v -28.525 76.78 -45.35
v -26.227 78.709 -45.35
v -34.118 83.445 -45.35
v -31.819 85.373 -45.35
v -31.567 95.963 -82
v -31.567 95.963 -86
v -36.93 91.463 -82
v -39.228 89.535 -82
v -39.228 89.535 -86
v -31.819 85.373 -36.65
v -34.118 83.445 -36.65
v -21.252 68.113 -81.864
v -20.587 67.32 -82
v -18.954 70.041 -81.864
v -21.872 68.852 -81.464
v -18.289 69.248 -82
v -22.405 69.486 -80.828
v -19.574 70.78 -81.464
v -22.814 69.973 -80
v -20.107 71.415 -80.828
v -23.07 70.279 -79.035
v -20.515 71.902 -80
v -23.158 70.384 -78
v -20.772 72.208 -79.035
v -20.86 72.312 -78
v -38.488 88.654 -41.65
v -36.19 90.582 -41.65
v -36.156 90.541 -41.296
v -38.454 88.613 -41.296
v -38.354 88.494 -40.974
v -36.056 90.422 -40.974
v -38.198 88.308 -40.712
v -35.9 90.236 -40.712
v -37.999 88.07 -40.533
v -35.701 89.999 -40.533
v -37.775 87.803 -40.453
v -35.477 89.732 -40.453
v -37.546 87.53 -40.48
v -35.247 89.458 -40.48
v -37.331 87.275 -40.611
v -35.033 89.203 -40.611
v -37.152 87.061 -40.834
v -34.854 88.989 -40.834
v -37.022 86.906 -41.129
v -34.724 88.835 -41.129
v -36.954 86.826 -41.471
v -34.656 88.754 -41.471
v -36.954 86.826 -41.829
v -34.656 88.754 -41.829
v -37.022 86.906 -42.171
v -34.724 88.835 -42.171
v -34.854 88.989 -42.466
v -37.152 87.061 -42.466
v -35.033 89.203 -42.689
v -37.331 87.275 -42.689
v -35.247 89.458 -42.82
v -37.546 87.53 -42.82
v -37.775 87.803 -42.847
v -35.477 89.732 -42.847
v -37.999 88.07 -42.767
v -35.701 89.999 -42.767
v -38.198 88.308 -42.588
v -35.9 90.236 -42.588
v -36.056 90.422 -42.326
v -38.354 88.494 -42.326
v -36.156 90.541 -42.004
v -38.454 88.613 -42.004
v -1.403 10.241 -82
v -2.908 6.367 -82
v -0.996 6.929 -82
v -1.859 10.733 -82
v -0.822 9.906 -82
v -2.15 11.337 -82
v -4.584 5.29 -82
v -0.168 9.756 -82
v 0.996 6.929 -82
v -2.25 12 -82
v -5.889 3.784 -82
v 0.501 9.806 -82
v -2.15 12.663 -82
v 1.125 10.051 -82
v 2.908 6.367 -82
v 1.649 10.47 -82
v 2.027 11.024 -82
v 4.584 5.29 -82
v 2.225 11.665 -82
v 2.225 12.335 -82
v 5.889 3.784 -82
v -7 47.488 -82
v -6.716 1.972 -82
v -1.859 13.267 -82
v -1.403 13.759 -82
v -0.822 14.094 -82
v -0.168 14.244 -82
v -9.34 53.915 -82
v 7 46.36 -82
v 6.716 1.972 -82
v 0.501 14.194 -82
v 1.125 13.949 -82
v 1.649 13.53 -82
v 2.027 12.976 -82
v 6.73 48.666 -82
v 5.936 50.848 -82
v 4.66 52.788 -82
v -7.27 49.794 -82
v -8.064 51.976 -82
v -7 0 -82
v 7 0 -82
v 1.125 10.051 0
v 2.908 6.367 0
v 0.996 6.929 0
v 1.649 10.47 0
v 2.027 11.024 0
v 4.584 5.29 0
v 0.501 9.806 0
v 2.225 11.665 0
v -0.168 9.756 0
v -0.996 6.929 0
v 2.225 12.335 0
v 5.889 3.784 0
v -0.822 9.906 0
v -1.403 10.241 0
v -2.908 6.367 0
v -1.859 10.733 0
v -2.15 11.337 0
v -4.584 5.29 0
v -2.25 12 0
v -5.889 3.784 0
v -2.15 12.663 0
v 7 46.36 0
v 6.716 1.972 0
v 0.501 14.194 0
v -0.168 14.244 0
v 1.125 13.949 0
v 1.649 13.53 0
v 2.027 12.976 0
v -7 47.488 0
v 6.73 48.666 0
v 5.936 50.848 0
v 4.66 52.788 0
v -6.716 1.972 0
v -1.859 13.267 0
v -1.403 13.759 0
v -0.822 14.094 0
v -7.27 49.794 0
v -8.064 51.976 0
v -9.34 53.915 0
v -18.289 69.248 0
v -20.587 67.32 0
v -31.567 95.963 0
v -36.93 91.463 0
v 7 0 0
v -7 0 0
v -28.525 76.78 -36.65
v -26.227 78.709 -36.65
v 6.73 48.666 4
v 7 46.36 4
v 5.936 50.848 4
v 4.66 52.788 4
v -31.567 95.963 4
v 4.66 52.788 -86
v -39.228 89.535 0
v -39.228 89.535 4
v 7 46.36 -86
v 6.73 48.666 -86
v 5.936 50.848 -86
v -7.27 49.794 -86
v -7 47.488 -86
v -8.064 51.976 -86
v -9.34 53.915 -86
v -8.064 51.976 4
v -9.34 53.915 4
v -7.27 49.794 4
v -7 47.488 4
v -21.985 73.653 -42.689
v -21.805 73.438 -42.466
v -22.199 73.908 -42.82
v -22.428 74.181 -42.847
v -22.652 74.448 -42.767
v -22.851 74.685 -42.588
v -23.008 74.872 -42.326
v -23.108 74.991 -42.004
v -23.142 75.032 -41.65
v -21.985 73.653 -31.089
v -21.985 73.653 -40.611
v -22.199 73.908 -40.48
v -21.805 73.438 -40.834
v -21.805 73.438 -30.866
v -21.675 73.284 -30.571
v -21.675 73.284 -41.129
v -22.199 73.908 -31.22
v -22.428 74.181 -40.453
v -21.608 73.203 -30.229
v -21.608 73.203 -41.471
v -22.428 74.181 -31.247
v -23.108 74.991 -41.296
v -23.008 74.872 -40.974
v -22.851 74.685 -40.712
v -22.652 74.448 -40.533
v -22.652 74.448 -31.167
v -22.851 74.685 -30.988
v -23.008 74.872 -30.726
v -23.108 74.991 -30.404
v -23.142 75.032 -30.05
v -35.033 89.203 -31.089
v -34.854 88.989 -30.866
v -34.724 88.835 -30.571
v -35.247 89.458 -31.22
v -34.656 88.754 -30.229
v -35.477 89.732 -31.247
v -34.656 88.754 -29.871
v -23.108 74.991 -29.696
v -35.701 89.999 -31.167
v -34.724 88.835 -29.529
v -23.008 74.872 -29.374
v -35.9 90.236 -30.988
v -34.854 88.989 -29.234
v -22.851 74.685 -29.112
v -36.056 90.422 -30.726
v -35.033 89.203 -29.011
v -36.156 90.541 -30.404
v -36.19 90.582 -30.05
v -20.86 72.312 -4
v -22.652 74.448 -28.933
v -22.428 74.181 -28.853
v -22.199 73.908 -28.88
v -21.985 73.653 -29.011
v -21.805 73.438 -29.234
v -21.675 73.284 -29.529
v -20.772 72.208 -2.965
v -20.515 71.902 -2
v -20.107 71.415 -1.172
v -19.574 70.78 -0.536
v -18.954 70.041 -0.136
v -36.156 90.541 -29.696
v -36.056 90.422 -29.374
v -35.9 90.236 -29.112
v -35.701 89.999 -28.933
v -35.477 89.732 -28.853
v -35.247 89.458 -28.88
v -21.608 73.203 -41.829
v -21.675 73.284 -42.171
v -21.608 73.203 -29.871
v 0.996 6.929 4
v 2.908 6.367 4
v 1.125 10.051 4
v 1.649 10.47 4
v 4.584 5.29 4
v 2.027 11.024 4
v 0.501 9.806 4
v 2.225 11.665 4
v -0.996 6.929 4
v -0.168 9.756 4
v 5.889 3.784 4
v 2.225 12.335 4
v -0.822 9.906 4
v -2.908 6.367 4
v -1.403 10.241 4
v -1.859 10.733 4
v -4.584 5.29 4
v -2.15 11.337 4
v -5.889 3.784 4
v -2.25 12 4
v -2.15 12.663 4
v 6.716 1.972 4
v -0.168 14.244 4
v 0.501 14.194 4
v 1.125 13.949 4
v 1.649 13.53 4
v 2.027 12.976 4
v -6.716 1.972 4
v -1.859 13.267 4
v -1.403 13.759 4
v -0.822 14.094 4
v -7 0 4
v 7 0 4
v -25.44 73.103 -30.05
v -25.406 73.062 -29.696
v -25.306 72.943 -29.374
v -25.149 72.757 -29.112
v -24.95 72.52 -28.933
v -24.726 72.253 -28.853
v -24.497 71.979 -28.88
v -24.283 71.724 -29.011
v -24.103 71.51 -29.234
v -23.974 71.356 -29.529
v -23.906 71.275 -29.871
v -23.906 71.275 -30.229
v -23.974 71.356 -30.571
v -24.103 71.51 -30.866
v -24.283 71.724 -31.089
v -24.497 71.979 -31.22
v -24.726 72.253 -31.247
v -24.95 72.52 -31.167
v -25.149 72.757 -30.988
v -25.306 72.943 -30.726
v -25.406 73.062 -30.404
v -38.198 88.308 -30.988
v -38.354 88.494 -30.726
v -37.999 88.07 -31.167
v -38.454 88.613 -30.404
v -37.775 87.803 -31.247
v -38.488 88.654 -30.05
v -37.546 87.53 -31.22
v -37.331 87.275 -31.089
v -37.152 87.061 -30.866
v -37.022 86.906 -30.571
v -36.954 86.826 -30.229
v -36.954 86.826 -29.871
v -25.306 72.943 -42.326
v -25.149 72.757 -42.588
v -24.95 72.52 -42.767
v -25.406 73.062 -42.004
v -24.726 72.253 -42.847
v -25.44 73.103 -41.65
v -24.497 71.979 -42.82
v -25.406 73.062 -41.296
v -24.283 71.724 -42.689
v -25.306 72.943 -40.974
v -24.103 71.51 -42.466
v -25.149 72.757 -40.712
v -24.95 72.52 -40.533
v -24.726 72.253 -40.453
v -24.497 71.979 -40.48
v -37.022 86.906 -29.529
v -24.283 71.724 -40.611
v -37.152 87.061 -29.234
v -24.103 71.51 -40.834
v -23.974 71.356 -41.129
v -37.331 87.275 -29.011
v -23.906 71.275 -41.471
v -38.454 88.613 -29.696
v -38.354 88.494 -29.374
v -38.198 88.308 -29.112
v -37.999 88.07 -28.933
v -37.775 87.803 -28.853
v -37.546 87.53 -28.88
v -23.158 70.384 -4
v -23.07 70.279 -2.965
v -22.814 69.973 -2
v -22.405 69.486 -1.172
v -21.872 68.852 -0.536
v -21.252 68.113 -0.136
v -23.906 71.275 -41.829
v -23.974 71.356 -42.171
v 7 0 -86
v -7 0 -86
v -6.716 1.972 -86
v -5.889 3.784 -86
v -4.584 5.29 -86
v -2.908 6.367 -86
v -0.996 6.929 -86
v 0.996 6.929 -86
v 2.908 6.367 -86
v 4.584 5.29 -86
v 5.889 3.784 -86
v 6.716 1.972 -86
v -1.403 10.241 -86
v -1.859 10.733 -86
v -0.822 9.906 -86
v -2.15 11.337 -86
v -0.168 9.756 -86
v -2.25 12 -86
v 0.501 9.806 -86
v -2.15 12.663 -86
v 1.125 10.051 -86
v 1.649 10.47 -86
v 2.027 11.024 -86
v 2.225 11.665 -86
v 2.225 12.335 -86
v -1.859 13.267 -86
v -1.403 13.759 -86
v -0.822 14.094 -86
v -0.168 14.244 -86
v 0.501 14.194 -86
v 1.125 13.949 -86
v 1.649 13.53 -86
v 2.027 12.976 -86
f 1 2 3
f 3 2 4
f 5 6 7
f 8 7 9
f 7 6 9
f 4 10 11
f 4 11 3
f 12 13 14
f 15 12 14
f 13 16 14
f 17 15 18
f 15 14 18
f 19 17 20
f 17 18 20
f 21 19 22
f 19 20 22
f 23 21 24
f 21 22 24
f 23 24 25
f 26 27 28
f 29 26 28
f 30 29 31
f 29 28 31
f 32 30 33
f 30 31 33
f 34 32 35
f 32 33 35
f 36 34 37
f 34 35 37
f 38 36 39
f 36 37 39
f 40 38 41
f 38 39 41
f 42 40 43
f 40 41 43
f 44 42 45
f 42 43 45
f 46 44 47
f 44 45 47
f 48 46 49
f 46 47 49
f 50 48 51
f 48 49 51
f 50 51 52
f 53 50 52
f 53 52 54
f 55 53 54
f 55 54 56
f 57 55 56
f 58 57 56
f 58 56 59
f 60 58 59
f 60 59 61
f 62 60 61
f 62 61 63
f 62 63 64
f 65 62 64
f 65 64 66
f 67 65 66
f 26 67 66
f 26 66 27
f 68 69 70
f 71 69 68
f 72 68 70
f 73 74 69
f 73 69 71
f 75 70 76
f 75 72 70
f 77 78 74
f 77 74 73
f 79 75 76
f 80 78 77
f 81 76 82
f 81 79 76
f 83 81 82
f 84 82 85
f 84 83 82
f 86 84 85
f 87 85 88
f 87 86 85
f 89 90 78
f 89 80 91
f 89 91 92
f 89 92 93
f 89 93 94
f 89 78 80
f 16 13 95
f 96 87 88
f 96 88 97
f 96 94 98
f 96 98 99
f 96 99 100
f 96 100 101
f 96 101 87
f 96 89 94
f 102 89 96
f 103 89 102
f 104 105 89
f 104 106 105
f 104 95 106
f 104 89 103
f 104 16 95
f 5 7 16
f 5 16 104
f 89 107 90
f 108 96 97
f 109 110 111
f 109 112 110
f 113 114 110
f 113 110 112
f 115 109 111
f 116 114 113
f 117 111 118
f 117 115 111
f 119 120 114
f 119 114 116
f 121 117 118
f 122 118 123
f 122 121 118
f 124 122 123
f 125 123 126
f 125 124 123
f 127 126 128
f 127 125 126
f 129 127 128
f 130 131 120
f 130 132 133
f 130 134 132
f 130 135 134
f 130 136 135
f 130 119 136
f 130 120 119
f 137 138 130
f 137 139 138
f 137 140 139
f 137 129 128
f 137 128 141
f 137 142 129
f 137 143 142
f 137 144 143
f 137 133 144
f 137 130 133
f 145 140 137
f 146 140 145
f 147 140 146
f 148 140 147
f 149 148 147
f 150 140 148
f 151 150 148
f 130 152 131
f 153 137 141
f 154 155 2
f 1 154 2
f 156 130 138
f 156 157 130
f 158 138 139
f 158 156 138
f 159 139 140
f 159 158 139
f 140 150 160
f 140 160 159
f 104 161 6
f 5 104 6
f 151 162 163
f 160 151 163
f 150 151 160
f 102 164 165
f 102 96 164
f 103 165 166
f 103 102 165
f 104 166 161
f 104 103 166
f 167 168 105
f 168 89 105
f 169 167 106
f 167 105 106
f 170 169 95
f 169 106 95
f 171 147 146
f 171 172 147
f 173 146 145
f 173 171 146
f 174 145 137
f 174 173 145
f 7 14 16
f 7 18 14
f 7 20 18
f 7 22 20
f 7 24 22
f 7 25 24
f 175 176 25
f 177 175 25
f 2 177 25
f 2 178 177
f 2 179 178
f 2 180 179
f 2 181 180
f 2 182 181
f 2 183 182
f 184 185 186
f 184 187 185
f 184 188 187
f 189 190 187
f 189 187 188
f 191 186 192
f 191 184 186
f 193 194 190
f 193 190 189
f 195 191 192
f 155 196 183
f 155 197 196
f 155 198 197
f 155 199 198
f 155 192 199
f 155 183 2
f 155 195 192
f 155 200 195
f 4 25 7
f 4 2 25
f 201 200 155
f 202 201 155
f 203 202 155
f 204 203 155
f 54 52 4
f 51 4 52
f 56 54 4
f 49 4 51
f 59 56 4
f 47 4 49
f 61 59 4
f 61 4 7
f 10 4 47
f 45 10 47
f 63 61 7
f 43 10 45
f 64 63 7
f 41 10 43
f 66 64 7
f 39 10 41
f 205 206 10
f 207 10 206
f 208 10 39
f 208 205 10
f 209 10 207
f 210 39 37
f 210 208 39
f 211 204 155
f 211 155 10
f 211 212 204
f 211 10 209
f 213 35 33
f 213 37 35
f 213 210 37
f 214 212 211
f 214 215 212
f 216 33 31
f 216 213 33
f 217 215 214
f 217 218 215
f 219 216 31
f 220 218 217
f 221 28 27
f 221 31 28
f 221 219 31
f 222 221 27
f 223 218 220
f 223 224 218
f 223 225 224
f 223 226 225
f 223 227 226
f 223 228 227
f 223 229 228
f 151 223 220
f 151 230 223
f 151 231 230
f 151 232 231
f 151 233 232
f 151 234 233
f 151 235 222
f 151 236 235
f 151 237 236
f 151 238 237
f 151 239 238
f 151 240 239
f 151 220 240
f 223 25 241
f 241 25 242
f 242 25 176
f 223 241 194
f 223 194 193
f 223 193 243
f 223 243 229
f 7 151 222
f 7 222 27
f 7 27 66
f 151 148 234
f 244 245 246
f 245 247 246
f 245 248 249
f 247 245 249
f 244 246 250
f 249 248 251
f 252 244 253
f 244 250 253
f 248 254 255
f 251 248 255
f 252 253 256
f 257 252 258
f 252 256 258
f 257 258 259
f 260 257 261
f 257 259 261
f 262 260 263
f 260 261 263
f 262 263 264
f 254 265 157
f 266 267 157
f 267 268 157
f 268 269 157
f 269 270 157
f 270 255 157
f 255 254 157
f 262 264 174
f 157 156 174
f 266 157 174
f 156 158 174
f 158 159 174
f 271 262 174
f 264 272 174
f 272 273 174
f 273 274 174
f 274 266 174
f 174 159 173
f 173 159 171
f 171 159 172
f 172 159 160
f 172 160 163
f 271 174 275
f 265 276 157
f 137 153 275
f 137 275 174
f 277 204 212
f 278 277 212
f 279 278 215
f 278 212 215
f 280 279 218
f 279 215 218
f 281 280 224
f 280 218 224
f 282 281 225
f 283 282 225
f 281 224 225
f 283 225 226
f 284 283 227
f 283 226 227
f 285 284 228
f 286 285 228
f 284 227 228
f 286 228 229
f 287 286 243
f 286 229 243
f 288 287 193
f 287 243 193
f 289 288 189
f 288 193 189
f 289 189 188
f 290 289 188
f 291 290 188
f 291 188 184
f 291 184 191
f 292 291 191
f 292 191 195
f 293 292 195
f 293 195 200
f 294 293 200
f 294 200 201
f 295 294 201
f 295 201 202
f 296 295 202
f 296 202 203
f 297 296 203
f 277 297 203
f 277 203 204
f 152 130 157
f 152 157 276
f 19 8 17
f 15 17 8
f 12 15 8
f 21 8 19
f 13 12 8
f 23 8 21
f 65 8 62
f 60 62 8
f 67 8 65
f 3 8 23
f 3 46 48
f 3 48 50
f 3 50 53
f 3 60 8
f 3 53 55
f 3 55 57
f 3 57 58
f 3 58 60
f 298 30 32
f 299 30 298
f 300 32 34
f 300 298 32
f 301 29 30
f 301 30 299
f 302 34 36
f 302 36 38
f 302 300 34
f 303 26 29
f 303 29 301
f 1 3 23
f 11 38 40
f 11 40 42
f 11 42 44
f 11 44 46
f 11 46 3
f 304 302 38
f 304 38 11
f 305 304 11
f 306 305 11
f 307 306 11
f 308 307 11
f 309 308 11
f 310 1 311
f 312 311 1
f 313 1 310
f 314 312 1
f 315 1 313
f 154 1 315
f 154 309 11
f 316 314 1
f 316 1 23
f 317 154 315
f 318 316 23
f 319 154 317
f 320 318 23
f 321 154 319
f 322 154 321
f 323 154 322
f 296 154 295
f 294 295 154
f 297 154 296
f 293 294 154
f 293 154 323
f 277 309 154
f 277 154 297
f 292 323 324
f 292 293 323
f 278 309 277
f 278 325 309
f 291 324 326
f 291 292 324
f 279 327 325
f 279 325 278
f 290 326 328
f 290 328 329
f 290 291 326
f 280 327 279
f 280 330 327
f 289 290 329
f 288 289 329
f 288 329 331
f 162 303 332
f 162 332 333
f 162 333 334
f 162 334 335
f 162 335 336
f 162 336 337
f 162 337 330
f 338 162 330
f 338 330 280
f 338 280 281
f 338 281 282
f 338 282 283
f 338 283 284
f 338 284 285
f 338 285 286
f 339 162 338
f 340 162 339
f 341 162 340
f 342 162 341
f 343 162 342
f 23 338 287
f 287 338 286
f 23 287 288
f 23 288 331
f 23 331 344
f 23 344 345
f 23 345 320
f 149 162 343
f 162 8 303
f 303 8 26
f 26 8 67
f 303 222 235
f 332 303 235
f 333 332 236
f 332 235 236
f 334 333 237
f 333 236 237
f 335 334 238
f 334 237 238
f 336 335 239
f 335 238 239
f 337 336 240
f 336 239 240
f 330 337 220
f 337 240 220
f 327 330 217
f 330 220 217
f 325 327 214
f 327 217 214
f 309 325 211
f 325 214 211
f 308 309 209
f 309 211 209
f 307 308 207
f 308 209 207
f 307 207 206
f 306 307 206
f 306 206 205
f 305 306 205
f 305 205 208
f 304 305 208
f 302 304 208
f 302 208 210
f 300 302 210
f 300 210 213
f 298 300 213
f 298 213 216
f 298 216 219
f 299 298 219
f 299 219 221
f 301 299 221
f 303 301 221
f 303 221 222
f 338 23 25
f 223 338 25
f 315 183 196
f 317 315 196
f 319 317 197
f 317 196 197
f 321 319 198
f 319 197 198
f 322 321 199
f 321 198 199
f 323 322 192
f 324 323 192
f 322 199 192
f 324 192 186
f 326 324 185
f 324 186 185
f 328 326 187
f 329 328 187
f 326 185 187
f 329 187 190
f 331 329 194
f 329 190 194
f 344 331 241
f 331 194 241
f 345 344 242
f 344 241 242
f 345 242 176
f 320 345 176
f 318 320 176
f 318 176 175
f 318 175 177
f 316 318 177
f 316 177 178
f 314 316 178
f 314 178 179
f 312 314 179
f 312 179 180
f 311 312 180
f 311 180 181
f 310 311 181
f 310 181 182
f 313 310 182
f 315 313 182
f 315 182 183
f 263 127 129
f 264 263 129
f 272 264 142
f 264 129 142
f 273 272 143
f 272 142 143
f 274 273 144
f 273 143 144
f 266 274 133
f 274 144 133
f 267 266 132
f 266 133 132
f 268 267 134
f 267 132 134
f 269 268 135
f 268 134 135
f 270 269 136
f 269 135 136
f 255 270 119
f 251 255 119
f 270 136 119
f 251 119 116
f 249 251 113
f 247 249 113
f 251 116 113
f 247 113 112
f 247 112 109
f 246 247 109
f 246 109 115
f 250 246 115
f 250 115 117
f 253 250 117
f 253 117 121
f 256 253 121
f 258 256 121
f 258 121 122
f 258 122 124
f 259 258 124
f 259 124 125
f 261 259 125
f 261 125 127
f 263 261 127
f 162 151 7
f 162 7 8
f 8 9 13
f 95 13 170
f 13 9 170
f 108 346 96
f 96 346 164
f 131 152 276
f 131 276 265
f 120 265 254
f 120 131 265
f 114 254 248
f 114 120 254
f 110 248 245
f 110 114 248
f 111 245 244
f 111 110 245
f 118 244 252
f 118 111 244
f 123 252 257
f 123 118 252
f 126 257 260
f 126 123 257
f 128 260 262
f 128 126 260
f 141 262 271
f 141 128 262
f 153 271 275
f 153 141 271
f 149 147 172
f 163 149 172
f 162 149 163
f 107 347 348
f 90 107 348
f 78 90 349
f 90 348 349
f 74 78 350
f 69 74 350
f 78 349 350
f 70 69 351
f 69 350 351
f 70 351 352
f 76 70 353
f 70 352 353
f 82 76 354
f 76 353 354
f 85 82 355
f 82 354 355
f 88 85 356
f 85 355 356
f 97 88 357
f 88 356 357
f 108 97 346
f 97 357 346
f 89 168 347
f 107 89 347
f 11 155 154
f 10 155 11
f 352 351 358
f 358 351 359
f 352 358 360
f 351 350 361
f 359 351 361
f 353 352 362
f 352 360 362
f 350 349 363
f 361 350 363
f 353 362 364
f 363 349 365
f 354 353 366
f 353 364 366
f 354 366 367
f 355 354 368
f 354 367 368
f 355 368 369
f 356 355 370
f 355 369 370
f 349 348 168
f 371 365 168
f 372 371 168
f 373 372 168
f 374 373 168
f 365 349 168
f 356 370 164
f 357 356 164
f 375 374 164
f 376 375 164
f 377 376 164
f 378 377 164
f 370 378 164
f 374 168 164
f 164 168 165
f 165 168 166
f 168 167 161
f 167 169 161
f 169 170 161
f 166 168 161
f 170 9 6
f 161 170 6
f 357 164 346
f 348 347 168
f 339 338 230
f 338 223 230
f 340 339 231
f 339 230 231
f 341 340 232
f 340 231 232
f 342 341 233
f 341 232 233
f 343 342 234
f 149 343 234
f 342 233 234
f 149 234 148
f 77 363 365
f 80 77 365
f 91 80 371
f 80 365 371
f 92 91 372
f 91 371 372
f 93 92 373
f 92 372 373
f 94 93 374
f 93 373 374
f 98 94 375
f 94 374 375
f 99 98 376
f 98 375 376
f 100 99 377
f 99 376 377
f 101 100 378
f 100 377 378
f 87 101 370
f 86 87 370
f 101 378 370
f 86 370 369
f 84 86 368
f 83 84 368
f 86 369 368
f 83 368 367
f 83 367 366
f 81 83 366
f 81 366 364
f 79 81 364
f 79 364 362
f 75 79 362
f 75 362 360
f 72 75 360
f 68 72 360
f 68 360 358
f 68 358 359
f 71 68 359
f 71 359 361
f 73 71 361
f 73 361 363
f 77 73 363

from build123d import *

# Parameters (mm, degrees)
ESTRUSIONE_ESTRUSIONE1_DEPTH = 4
ESTRUSIONE_ESTRUSIONE2_DEPTH = 82
ESTRUSIONE_ESTRUSIONE3_START = 4
ESTRUSIONE_ESTRUSIONE3_DEPTH = 4
FORO_PER_VITE_M4_1_D         = 4.5
FORO_PER_VITE_M4_1_DEPTH     = 188
FORO_PER_VITE_M4_1_TIP       = 1.351936393
SCHIZZO6_R                   = 1.2
SCHIZZO6_W                   = 8.7
SCHIZZO6_H                   = 8.7
TAGLIO_ESTRUSIONE1_DEPTH     = 10
RACCORDO1_R                  = 10
RACCORDO2_R                  = 4


with BuildPart() as part:
    # Schizzo1 → Estrusione-Estrusione1 (new body)
    with BuildSketch(Plane.XY):
        with BuildLine():
            Line((-7, 0), (-7, 51.127312028))
            Line((-7, 51.127312028), (-39.227701012, 89.53479049))
            Line((-39.227701012, 89.53479049), (-31.567256581, 95.962666587))
            Line((-31.567256581, 95.962666587), (7, 50))
            Line((7, 50), (7, 0))
            ThreePointArc((7, 0), (0, 7), (-7, 0))
        make_face()
    extrude(amount=ESTRUSIONE_ESTRUSIONE1_DEPTH)

    # Schizzo4 → Estrusione-Estrusione2 (add)
    with BuildSketch(Plane.XY):
        Polygon((-39.227701012, 89.53479049), (-23.15801077, 70.383679412), (-20.859877441, 72.312042241), (-36.929567683, 91.463153319), align=None)
    extrude(amount=-ESTRUSIONE_ESTRUSIONE2_DEPTH)

    # Schizzo5 → Estrusione-Estrusione3 (add)
    with BuildSketch(Plane(origin=(0, 0, -82), x_dir=(-1, 0, 0), z_dir=(0, 0, -1)).offset(ESTRUSIONE_ESTRUSIONE3_START)):
        with BuildLine():
            Line((-7, 0), (-7, 50))
            Line((-7, 50), (31.567256581, 95.962666587))
            Line((31.567256581, 95.962666587), (39.227701012, 89.53479049))
            Line((39.227701012, 89.53479049), (7, 51.127312028))
            Line((7, 51.127312028), (7, 0))
            ThreePointArc((7, 0), (0, 7), (-7, 0))
        make_face()
    extrude(amount=-ESTRUSIONE_ESTRUSIONE3_DEPTH)

    # Foro per Vite M4-1
    with Locations(Plane.XY.offset(4)):
        with Locations((0, 12)):
            Hole(FORO_PER_VITE_M4_1_D / 2, depth=FORO_PER_VITE_M4_1_DEPTH)
            with Locations((0, 0, -(FORO_PER_VITE_M4_1_DEPTH + FORO_PER_VITE_M4_1_TIP / 2))):  # 118° drill point
                Cone(0, FORO_PER_VITE_M4_1_D / 2, FORO_PER_VITE_M4_1_TIP, mode=Mode.SUBTRACT)

    # Schizzo6 → Taglio-Estrusione1 (cut)
    with BuildSketch(Plane(origin=(23.365651345, 19.606109426, 0), x_dir=(0, 0, -1), z_dir=(0.7660444431189758, 0.642787609686542, 0))):
        with Locations(Location((30.05, 91.452708888, 0), (0, 0, 90))):
            Circle(SCHIZZO6_R)
        with Locations(Location((41.65, 91.452708888, 0), (0, 0, 90))):
            Circle(SCHIZZO6_R)
        with Locations(Location((30.05, 71.152708888, 0), (0, 0, 90))):
            Circle(SCHIZZO6_R)
        with Locations(Location((41.65, 71.152708888, 0), (0, 0, 90))):
            Circle(SCHIZZO6_R)
        with Locations((41, 81.502708888)):
            Rectangle(SCHIZZO6_W, SCHIZZO6_H)
    extrude(amount=-TAGLIO_ESTRUSIONE1_DEPTH, mode=Mode.SUBTRACT)

    # Raccordo1
    raccordo1_edges = [part.edges().sort_by_distance(p)[0] for p in [
        (-7, 51.127312028, 2),
        (7, 50, 2),
        (-7, 51.127312028, -84),
        (7, 50, -84),
    ]]
    fillet(raccordo1_edges, radius=RACCORDO1_R)

    # Raccordo2
    raccordo2_edges = [part.edges().sort_by_distance(p)[0] for p in [
        (-22.008944106, 71.347860827, -82),
        (-22.008944106, 71.347860827, 0),
    ]]
    fillet(raccordo2_edges, radius=RACCORDO2_R)


solid = part.part
